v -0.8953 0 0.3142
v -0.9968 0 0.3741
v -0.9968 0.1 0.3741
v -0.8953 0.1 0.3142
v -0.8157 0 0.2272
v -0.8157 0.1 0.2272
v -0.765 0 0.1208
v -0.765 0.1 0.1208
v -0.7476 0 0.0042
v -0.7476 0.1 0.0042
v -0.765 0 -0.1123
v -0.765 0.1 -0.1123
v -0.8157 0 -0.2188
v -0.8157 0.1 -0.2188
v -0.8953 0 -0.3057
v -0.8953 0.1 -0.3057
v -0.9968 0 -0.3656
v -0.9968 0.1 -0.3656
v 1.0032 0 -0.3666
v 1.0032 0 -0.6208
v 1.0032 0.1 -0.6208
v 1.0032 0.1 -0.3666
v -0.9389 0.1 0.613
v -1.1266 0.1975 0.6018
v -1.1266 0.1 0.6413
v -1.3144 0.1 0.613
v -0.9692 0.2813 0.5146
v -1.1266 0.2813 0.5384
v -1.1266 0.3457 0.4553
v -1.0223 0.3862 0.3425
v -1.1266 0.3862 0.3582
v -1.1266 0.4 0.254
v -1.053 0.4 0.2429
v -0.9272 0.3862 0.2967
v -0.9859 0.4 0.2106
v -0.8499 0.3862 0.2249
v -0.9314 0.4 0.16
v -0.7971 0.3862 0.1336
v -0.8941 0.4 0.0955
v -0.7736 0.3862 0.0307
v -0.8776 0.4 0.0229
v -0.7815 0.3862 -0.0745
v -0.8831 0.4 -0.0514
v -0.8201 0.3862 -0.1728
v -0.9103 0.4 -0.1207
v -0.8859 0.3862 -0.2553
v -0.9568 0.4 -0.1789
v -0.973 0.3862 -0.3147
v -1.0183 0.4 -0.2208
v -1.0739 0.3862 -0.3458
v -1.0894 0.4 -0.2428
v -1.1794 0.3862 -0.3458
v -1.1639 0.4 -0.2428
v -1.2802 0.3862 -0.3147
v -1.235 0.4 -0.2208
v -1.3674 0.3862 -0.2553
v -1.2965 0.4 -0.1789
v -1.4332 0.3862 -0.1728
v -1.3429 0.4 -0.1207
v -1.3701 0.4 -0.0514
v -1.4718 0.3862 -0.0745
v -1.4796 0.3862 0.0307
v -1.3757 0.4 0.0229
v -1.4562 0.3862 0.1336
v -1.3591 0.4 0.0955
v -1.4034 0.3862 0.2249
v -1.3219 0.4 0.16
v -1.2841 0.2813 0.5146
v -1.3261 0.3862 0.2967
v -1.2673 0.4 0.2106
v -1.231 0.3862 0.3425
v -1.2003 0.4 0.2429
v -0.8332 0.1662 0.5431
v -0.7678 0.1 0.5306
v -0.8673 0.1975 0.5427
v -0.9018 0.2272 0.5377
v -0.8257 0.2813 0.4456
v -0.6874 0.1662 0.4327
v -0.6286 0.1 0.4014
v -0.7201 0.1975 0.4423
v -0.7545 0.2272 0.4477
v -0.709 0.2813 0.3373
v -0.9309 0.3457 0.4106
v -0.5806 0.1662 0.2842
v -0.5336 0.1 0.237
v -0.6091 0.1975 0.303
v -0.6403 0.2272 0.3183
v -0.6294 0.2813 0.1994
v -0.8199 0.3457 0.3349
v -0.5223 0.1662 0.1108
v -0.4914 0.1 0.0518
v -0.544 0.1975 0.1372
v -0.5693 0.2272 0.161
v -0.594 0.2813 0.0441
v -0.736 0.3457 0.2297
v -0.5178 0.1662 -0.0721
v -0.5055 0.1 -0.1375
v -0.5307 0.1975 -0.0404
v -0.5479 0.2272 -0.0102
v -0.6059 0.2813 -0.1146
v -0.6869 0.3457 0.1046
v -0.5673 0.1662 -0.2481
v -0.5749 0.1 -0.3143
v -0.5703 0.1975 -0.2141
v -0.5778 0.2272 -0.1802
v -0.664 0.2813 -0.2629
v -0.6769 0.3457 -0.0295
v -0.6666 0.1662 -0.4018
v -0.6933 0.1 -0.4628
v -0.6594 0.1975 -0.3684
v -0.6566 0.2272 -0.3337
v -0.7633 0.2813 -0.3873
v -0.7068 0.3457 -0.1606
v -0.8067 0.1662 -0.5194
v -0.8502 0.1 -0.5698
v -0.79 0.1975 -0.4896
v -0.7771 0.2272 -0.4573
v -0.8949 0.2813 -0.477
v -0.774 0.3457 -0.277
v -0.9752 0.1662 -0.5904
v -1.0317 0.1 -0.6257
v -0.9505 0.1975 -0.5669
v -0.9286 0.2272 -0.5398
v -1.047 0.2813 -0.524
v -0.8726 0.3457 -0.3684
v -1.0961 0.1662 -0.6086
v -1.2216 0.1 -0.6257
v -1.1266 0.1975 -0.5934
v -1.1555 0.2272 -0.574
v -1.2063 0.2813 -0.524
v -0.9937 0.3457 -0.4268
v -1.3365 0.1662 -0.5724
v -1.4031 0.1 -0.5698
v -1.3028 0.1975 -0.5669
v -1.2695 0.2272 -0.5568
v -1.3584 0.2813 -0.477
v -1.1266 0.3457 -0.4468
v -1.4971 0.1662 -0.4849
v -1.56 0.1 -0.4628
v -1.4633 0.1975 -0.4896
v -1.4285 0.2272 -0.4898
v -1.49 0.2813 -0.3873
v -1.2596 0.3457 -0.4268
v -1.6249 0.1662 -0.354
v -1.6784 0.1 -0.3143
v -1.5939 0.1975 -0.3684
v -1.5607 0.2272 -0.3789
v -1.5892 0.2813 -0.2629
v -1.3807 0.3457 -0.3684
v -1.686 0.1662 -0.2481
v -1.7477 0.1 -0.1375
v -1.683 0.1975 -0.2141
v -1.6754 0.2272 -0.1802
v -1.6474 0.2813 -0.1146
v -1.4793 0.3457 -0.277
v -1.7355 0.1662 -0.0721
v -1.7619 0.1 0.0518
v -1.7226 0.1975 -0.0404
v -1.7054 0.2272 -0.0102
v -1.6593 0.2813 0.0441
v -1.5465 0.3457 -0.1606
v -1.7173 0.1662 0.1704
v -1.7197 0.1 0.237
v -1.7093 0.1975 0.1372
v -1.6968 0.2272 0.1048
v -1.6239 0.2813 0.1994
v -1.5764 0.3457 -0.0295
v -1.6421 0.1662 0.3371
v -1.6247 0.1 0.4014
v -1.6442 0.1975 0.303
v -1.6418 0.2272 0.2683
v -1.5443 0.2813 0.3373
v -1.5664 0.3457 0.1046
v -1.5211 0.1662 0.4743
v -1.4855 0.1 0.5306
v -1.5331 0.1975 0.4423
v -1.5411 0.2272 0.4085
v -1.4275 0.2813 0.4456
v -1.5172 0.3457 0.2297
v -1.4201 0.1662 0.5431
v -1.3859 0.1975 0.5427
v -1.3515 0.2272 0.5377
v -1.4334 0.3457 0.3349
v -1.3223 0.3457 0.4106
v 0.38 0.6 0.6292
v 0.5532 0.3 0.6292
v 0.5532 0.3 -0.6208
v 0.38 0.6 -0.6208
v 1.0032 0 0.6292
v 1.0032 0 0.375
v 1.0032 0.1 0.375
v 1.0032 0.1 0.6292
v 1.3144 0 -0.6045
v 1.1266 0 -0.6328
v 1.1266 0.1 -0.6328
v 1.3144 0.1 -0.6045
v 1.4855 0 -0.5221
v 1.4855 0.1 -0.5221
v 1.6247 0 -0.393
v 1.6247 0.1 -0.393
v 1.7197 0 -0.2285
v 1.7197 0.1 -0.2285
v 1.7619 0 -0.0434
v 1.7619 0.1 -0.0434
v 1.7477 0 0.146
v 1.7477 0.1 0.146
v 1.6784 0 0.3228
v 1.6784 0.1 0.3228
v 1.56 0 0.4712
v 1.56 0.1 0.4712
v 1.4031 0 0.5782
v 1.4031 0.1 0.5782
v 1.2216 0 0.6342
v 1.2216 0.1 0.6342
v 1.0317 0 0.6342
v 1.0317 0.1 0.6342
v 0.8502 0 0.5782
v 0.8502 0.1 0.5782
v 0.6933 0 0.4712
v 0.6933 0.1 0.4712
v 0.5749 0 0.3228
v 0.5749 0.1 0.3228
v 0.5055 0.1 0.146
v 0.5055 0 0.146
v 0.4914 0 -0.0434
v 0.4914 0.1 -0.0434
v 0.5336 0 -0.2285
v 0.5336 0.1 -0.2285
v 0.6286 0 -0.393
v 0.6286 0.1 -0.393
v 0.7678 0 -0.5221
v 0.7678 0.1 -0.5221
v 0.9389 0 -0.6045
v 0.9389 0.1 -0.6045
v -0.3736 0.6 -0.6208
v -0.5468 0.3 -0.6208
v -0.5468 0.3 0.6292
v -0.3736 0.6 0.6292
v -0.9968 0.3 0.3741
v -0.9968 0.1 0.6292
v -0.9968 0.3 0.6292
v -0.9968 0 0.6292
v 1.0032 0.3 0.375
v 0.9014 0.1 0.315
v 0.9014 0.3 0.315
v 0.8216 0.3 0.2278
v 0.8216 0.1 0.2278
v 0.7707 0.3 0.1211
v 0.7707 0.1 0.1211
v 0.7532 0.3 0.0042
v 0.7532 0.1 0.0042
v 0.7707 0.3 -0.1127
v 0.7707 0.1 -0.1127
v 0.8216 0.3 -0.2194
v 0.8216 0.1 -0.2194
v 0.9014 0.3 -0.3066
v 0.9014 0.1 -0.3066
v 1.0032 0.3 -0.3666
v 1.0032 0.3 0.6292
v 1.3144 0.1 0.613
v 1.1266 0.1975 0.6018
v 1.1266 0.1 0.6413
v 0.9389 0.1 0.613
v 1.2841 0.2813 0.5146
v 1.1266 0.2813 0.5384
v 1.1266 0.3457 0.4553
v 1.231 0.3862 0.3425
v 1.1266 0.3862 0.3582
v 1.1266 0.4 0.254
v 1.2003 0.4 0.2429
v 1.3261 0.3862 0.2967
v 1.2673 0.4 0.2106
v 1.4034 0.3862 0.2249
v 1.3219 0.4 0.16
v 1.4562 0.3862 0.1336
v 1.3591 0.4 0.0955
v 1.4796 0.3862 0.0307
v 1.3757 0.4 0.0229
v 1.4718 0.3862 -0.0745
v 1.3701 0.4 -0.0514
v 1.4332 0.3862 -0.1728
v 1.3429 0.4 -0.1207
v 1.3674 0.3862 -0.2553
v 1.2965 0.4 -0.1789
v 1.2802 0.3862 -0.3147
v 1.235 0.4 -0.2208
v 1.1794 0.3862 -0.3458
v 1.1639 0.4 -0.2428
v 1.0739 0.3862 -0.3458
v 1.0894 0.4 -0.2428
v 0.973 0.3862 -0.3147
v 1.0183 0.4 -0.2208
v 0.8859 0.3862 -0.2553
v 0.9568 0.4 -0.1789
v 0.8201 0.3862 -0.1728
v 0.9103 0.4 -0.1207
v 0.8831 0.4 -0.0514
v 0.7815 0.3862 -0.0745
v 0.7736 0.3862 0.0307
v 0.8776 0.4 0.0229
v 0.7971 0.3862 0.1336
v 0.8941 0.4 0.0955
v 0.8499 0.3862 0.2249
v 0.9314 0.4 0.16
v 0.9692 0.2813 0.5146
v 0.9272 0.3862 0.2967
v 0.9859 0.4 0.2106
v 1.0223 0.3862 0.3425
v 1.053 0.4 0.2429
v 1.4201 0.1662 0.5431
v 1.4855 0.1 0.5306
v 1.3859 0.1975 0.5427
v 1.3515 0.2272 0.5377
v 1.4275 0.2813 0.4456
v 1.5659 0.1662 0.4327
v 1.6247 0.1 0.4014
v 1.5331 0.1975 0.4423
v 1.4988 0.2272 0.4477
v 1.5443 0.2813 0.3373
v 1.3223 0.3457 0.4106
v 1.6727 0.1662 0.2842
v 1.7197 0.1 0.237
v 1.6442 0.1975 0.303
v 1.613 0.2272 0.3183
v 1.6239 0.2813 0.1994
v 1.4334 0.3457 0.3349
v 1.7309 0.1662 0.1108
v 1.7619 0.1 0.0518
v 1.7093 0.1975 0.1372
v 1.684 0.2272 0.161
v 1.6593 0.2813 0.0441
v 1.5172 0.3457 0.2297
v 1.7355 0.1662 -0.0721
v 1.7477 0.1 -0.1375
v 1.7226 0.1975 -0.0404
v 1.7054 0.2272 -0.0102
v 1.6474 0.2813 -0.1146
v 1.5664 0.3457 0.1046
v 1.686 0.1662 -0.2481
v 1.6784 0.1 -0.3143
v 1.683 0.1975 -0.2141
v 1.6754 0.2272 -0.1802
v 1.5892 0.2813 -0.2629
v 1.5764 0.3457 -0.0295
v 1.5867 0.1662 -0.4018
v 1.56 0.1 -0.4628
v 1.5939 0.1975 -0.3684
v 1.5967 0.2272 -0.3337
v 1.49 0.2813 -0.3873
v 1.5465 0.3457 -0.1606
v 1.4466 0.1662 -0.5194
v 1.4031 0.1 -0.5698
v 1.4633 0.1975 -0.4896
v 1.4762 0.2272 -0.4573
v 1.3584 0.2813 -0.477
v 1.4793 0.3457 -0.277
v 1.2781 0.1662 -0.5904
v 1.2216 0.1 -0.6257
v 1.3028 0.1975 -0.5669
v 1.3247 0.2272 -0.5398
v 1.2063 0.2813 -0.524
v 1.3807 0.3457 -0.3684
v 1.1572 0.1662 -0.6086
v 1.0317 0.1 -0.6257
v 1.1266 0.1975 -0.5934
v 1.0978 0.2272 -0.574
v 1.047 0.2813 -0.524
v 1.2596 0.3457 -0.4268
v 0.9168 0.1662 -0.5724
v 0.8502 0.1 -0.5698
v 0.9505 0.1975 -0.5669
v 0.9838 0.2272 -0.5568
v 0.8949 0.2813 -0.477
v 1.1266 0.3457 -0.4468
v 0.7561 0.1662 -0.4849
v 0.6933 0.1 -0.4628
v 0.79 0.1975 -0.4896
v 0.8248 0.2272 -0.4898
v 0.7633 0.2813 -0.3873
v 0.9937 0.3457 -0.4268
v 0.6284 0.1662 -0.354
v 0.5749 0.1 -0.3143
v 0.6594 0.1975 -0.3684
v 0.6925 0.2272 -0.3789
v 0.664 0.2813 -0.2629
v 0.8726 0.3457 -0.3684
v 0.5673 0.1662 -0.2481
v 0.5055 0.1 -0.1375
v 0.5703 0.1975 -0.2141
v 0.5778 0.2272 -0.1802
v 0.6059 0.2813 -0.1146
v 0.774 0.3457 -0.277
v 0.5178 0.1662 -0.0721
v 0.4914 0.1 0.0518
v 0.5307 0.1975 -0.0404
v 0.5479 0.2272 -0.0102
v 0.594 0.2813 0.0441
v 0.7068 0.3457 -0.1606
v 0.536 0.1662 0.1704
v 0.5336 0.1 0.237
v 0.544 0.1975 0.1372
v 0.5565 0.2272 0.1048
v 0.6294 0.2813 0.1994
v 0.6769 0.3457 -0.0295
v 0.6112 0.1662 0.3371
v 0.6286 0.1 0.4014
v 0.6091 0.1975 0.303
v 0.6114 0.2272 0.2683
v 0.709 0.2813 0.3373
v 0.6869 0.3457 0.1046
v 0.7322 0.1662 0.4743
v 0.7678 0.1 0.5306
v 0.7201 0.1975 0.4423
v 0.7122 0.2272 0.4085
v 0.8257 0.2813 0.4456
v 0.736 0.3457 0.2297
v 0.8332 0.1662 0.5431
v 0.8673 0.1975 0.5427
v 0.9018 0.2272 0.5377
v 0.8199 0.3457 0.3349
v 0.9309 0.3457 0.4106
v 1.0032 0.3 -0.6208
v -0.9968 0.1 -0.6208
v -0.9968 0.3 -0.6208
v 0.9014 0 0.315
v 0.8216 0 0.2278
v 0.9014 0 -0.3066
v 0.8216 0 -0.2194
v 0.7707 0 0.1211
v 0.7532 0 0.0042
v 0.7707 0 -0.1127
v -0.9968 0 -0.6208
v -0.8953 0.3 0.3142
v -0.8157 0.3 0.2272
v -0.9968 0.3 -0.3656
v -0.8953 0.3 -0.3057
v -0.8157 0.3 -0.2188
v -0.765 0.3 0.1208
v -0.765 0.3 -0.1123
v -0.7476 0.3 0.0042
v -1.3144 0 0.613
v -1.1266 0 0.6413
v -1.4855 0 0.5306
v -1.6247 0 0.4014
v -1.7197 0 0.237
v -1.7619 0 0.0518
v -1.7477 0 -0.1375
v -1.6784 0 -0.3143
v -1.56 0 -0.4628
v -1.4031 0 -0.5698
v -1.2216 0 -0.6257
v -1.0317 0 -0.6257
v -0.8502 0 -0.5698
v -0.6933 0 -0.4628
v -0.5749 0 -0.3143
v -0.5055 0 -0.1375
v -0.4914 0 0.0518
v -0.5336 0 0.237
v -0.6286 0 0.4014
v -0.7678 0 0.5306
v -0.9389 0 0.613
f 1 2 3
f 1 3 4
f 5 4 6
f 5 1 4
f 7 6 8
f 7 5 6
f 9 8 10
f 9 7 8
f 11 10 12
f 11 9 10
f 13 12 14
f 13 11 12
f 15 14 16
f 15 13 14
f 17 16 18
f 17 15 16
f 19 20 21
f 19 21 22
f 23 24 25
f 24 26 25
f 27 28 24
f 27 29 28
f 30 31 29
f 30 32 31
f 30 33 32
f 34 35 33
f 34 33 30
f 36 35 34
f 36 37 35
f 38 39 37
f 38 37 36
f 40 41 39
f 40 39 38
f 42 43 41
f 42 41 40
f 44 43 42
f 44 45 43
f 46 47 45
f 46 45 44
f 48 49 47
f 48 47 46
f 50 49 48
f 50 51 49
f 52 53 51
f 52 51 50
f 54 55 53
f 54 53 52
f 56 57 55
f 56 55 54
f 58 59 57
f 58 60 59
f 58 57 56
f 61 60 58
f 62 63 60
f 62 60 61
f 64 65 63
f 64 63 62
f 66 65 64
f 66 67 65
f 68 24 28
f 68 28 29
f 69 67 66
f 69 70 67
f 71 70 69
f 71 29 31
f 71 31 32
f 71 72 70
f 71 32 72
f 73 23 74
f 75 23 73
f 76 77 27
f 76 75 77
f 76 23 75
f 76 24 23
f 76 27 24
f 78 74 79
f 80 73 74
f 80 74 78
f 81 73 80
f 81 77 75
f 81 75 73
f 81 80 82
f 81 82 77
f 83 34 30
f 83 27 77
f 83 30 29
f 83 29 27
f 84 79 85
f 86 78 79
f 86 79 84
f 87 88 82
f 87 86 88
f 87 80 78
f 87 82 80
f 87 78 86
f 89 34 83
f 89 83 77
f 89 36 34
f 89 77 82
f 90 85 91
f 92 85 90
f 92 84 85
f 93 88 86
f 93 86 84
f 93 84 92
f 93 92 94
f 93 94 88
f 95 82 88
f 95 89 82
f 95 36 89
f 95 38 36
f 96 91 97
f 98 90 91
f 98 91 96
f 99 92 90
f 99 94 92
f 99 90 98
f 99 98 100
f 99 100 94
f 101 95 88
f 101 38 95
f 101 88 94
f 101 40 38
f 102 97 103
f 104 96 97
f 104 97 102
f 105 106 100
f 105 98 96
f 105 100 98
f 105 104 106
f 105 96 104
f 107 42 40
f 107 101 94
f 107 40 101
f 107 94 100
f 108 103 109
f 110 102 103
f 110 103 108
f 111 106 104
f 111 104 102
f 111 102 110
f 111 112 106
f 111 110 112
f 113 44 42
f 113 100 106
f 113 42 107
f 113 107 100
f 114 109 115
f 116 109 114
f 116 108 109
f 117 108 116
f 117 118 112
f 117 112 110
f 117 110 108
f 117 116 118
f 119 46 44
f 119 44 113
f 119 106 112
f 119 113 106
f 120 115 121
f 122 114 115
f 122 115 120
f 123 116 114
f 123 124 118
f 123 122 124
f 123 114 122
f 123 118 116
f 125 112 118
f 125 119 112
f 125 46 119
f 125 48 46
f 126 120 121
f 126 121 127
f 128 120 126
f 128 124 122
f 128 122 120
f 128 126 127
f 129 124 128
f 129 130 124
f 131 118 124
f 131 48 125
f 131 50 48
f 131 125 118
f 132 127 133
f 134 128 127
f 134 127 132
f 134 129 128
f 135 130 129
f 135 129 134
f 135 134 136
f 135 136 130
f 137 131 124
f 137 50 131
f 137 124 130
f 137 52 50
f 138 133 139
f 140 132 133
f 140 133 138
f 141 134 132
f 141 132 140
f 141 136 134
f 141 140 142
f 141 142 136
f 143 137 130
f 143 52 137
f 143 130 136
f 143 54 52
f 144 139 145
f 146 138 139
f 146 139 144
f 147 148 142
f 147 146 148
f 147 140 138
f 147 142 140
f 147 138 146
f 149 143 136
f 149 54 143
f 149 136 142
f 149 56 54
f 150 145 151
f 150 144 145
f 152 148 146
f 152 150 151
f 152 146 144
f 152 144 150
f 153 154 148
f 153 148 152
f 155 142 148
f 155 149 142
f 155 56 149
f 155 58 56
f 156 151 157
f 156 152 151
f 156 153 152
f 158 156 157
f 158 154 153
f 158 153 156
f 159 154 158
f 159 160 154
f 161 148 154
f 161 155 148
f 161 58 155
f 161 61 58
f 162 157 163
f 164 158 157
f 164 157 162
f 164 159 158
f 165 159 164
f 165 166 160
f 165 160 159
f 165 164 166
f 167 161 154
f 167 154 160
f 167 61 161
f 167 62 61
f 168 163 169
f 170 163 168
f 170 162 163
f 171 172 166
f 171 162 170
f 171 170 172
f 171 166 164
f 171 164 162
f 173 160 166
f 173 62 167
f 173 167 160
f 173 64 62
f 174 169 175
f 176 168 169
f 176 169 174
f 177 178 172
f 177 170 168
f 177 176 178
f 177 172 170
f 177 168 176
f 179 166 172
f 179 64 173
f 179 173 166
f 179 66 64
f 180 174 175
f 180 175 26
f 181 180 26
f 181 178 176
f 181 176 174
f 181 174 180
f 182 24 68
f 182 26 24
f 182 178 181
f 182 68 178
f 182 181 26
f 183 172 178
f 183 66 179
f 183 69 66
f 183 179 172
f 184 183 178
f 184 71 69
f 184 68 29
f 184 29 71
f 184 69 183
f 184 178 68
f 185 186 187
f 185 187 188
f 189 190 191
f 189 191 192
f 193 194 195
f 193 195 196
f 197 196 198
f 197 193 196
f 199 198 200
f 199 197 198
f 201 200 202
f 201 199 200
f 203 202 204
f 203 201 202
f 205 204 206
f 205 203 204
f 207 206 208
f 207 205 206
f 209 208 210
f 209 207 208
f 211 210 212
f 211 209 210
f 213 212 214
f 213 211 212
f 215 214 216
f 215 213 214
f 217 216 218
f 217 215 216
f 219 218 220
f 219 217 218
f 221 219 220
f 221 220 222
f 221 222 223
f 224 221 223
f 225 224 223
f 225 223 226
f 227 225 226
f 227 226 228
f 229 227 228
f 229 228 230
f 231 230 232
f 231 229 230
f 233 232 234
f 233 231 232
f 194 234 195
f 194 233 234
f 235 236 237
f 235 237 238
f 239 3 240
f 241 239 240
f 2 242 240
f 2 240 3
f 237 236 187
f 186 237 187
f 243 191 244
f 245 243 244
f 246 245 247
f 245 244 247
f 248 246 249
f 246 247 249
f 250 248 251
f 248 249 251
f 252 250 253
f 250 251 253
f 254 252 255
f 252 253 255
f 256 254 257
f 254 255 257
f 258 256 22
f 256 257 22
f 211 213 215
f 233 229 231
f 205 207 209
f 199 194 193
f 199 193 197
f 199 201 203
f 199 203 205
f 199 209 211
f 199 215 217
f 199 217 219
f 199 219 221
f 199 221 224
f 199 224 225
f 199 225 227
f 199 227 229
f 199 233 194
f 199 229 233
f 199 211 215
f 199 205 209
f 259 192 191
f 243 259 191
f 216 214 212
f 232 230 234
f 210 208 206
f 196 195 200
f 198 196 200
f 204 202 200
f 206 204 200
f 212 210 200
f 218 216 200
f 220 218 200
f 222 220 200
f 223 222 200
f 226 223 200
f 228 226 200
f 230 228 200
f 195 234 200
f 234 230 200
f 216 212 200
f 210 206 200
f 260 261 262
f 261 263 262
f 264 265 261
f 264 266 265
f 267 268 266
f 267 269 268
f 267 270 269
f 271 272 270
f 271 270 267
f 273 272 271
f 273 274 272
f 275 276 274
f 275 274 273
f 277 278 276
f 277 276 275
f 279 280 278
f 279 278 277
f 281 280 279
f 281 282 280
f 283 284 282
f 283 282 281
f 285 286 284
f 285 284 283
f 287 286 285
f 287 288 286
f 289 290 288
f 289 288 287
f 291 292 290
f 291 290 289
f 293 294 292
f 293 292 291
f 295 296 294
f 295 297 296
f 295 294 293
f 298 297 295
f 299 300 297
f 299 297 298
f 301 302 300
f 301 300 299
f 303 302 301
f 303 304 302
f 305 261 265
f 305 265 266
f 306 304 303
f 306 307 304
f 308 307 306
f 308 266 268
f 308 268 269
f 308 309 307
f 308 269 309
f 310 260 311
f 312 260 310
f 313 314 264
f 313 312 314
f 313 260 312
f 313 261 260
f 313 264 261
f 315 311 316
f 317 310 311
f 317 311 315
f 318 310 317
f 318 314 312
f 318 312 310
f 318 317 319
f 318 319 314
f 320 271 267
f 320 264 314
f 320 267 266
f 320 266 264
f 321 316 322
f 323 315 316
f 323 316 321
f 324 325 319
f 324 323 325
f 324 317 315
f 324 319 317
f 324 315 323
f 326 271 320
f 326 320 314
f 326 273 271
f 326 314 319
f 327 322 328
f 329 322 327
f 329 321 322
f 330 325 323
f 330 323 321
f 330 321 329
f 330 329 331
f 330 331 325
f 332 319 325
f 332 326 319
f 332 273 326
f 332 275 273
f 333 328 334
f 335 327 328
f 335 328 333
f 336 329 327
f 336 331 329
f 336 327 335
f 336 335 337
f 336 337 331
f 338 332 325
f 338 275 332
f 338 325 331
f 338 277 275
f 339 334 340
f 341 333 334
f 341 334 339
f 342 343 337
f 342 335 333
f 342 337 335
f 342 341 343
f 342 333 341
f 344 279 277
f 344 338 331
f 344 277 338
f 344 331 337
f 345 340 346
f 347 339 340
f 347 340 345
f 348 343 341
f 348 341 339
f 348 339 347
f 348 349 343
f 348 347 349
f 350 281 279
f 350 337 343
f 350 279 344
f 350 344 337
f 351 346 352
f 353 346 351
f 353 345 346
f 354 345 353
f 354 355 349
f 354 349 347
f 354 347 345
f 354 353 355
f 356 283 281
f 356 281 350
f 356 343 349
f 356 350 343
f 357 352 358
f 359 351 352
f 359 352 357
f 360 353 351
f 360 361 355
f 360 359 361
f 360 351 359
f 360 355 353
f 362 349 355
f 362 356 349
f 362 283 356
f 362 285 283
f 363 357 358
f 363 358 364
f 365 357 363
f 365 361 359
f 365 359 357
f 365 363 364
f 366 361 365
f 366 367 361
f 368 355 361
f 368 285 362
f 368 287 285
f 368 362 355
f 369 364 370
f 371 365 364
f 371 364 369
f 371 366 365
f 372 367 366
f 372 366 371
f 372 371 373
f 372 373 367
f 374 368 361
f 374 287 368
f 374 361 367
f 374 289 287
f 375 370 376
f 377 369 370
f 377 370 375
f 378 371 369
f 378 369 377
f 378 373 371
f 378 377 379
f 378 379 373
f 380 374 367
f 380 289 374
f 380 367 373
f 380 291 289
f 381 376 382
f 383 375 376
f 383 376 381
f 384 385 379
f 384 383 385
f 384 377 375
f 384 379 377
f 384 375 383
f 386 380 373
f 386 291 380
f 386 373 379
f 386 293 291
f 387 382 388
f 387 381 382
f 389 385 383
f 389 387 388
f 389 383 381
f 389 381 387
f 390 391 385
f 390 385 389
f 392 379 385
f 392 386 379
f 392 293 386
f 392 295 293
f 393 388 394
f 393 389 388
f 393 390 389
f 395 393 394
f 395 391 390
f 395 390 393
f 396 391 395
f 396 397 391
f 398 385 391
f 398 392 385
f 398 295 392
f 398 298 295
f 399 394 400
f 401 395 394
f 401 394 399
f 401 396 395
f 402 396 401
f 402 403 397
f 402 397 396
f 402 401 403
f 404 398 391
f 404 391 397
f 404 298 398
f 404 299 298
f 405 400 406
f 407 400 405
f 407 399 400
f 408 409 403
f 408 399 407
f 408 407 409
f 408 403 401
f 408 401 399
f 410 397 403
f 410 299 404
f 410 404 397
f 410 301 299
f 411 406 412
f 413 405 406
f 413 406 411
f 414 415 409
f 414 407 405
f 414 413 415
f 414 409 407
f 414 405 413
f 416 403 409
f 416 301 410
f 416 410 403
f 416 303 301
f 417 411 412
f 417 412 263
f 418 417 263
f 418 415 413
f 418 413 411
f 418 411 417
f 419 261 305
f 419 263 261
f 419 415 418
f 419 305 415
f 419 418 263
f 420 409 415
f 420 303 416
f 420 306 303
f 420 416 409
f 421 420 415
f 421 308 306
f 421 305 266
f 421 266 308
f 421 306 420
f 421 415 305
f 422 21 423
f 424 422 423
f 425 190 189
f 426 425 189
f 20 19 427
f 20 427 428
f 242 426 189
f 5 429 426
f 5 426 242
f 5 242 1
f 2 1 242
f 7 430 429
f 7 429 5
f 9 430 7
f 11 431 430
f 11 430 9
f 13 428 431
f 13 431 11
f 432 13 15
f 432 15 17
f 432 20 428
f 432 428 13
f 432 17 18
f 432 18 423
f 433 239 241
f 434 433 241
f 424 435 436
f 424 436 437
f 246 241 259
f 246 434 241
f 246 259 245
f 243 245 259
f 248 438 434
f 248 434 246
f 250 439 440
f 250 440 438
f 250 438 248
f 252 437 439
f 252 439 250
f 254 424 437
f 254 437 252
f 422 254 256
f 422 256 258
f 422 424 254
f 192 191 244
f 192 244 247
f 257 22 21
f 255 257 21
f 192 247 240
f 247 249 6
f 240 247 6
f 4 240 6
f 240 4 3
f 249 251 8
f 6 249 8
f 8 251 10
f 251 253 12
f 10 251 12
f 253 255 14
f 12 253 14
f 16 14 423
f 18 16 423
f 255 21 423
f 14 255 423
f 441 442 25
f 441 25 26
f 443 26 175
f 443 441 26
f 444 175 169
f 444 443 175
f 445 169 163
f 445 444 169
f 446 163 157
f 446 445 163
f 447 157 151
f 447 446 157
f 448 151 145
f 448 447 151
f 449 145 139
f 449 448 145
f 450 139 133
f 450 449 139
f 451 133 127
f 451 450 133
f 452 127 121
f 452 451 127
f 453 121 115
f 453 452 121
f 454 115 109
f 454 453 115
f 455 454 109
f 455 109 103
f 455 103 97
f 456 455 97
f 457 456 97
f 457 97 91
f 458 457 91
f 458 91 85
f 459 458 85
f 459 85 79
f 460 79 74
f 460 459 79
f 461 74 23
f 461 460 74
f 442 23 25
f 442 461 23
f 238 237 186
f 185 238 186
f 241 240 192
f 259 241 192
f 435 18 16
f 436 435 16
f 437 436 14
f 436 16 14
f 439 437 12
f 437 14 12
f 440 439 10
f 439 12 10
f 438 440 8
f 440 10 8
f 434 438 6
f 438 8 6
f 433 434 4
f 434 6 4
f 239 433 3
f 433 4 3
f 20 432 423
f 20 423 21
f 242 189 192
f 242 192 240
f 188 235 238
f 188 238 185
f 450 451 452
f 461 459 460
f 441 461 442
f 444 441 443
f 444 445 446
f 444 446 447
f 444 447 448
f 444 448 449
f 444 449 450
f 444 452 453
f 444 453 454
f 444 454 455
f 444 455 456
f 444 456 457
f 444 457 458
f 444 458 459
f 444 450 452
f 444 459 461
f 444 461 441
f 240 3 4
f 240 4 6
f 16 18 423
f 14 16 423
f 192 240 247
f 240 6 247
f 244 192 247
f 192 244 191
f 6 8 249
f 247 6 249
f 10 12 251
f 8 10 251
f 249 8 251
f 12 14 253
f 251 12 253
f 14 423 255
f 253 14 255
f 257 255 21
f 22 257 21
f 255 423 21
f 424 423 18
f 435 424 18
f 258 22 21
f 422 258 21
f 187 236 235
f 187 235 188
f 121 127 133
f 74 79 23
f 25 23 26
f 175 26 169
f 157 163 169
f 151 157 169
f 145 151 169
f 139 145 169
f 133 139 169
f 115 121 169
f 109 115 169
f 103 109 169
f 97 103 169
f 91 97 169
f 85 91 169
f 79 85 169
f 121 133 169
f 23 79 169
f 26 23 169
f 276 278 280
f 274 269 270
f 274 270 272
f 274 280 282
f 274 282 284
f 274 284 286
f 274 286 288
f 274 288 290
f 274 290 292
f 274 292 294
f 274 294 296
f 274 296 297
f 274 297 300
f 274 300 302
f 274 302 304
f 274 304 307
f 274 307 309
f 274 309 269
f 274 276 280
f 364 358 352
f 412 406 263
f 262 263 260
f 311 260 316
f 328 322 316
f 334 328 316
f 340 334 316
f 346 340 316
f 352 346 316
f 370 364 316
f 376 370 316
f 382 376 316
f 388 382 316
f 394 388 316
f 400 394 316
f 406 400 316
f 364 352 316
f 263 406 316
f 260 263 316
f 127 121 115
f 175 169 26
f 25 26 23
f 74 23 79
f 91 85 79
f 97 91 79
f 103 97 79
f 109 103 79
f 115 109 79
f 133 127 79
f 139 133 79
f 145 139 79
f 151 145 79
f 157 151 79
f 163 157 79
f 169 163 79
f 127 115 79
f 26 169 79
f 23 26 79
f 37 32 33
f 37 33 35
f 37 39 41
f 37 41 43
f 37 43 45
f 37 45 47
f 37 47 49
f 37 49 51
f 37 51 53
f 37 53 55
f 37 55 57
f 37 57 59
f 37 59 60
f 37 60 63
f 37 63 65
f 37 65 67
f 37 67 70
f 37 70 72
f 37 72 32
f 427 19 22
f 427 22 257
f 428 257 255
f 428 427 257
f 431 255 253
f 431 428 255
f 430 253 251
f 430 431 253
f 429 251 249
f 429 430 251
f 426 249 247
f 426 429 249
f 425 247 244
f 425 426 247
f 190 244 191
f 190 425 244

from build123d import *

# Parameters (mm, degrees)
BOSS_EXTRUDE1_DEPTH   = 0.1
SKETCH2_R             = 0.637065443
BOSS_EXTRUDE2_DEPTH   = 0.1
BOSS_EXTRUDE2_2_DEPTH = 0.1
BOSS_EXTRUDE3_DEPTH   = 0.2
SKETCH5_R             = 0.637065443
BOSS_EXTRUDE4_DEPTH   = 0.3
SKETCH6_R             = 0.637065443
BOSS_EXTRUDE5_DEPTH   = 0.3
FILLET1_R             = 0.4
FILLET2_R             = 0.4
SKETCH10_W            = 1.1
SKETCH10_H            = 1.25
BOSS_EXTRUDE6_DEPTH   = 0.3
CHAMFER1_SIZE         = 0.3
CHAMFER1_SIZE_2       = 0.173205081


with BuildPart() as part:
    # Sketch1 → Boss-Extrude1 (new body)
    with BuildSketch(Plane(origin=(0, 0, 0), x_dir=(1, 0, 0), z_dir=(0, 1, 0))):
        with BuildLine():
            ThreePointArc((1.003239919, 0.366587161), (0.753239919, -0.004222763), (1.003239919, -0.375032687))
            Line((1.003239919, -0.375032687), (1.003239919, -0.629222763))
            Line((1.003239919, -0.629222763), (-0.996760081, -0.629222763))
            Line((-0.996760081, -0.629222763), (-0.996760081, -0.374094755))
            ThreePointArc((-0.996760081, -0.374094755), (-0.747629413, -0.004222763), (-0.996760081, 0.365649229))
            Line((-0.996760081, 0.365649229), (-0.996760081, 0.620777237))
            Line((-0.996760081, 0.620777237), (1.003239919, 0.620777237))
            Line((1.003239919, 0.620777237), (1.003239919, 0.366587161))
        make_face()
    extrude(amount=BOSS_EXTRUDE1_DEPTH)


with BuildPart() as body_2:
    # Sketch2 → Boss-Extrude2 (new body)
    with BuildSketch(Plane.XZ):
        with Locations(Location((-1.126639185, 0.004222763, 0), (0, 0, 90))):
            Circle(SKETCH2_R)
    extrude(amount=-BOSS_EXTRUDE2_DEPTH)


with BuildPart() as body_3:
    # Sketch2 → Boss-Extrude2 2 (new body)
    with BuildSketch(Plane.XZ):
        with Locations(Location((1.126639185, 0.004222763, 0), (0, 0, 270))):
            Circle(SKETCH2_R)
    extrude(amount=-BOSS_EXTRUDE2_2_DEPTH)


with BuildPart() as body_4:
    # Sketch4 → Boss-Extrude3 (new body)
    with BuildSketch(Plane(origin=(0, 0.1, 0), x_dir=(1, 0, 0), z_dir=(0, 1, 0))):
        with BuildLine():
            Line((1.003239919, 0.366587161), (1.003239919, 0.620777237))
            Line((1.003239919, 0.620777237), (-0.996760081, 0.620777237))
            Line((-0.996760081, 0.620777237), (-0.996760081, 0.365649229))
            ThreePointArc((-0.996760081, 0.365649229), (-0.747629413, -0.004222763), (-0.996760081, -0.374094755))
            Line((-0.996760081, -0.374094755), (-0.996760081, -0.629222763))
            Line((-0.996760081, -0.629222763), (1.003239919, -0.629222763))
            Line((1.003239919, -0.629222763), (1.003239919, -0.375032687))
            ThreePointArc((1.003239919, -0.375032687), (0.753239919, -0.004222763), (1.003239919, 0.366587161))
        make_face()
    extrude(amount=BOSS_EXTRUDE3_DEPTH)


with BuildPart() as body_5:
    # Sketch5 → Boss-Extrude4 (new body)
    with BuildSketch(Plane(origin=(0, 0.1, 0), x_dir=(1, 0, 0), z_dir=(0, 1, 0))):
        with Locations(Location((1.126639185, -0.004222763, 0), (0, 0, 270))):
            Circle(SKETCH5_R)
    extrude(amount=BOSS_EXTRUDE4_DEPTH)

    # Fillet1
    # the kernel refuses this fillet: 0.4 mm, written as the material it takes off along each edge
    with BuildSketch(Plane(origin=(1.126639185, 0.4, 0.004222763), x_dir=(0, 0, 1), z_dir=(-1, 0, 0))) as fillet1_piece_1:
        with BuildLine():
            CenterArc((0.249767109, -0.4), FILLET1_R, 14.477512186, 75.522487814)
            Line((0.249767109, 0), (0.249767109, 0.008))
            Line((0.249767109, 0.008), (0.637065443, 0.008))
            Line((0.637065443, 0.008), (0.645065443, 0))
            ThreePointArc((0.645065443, 0), (0.645065443, -0.15), (0.64481141, -0.298))
            Line((0.64481141, -0.298), (0.637065443, -0.3))
        make_face()
    revolve(axis=Axis((1.126639185, 0.4, 0.004222763), (0, 1, 0)), mode=Mode.SUBTRACT)


with BuildPart() as body_6:
    # Sketch6 → Boss-Extrude5 (new body)
    with BuildSketch(Plane(origin=(0, 0.1, 0), x_dir=(1, 0, 0), z_dir=(0, 1, 0))):
        with Locations(Location((-1.126639185, -0.004222763, 0), (0, 0, 270))):
            Circle(SKETCH6_R)
    extrude(amount=BOSS_EXTRUDE5_DEPTH)

    # Fillet2
    # the kernel refuses this fillet: 0.4 mm, written as the material it takes off along each edge
    with BuildSketch(Plane(origin=(-1.126639185, 0.4, 0.004222763), x_dir=(0, 0, 1), z_dir=(-1, 0, 0))) as fillet2_piece_1:
        with BuildLine():
            CenterArc((0.249767109, -0.4), FILLET2_R, 14.477512186, 75.522487814)
            Line((0.249767109, 0), (0.249767109, 0.008))
            Line((0.249767109, 0.008), (0.637065443, 0.008))
            Line((0.637065443, 0.008), (0.645065443, 0))
            ThreePointArc((0.645065443, 0), (0.645065443, -0.15), (0.64481141, -0.298))
            Line((0.64481141, -0.298), (0.637065443, -0.3))
        make_face()
    revolve(axis=Axis((-1.126639185, 0.4, 0.004222763), (0, 1, 0)), mode=Mode.SUBTRACT)


with BuildPart() as body_7:
    # Sketch10 → Boss-Extrude6 (new body)
    with BuildSketch(Plane(origin=(0, 0.3, 0), x_dir=(1, 0, 0), z_dir=(0, 1, 0))):
        with Locations((0.003239919, -0.004222763)):
            Rectangle(SKETCH10_W, SKETCH10_H)
    extrude(amount=BOSS_EXTRUDE6_DEPTH)

    # Chamfer1
    # the kernel refuses this chamfer: 0.3, 0.173205081 mm, written as the material it takes off along each edge
    with BuildSketch(Plane(origin=(-0.546760081, 0.6, -1.396902964), x_dir=(-0.019326765612700723, -0.999813220622208, 0), z_dir=(0, 0, 1)), Plane(origin=(0.553239919, 0.6, 1.405348489), x_dir=(0.019326765612700723, -0.999813220622208, 0), z_dir=(0, 0, -1))) as chamfer1_piece_1:
        Polygon((CHAMFER1_SIZE * 0.999813220622, CHAMFER1_SIZE * 0.0193267656127), (-CHAMFER1_SIZE_2 * 0.0193267655856, CHAMFER1_SIZE_2 * 0.999813219219), (0, 0), align=None)
    extrude(amount=2.802251453, mode=Mode.SUBTRACT)


solid = Compound([part.part, body_2.part, body_3.part, body_4.part, body_5.part, body_6.part, body_7.part])
